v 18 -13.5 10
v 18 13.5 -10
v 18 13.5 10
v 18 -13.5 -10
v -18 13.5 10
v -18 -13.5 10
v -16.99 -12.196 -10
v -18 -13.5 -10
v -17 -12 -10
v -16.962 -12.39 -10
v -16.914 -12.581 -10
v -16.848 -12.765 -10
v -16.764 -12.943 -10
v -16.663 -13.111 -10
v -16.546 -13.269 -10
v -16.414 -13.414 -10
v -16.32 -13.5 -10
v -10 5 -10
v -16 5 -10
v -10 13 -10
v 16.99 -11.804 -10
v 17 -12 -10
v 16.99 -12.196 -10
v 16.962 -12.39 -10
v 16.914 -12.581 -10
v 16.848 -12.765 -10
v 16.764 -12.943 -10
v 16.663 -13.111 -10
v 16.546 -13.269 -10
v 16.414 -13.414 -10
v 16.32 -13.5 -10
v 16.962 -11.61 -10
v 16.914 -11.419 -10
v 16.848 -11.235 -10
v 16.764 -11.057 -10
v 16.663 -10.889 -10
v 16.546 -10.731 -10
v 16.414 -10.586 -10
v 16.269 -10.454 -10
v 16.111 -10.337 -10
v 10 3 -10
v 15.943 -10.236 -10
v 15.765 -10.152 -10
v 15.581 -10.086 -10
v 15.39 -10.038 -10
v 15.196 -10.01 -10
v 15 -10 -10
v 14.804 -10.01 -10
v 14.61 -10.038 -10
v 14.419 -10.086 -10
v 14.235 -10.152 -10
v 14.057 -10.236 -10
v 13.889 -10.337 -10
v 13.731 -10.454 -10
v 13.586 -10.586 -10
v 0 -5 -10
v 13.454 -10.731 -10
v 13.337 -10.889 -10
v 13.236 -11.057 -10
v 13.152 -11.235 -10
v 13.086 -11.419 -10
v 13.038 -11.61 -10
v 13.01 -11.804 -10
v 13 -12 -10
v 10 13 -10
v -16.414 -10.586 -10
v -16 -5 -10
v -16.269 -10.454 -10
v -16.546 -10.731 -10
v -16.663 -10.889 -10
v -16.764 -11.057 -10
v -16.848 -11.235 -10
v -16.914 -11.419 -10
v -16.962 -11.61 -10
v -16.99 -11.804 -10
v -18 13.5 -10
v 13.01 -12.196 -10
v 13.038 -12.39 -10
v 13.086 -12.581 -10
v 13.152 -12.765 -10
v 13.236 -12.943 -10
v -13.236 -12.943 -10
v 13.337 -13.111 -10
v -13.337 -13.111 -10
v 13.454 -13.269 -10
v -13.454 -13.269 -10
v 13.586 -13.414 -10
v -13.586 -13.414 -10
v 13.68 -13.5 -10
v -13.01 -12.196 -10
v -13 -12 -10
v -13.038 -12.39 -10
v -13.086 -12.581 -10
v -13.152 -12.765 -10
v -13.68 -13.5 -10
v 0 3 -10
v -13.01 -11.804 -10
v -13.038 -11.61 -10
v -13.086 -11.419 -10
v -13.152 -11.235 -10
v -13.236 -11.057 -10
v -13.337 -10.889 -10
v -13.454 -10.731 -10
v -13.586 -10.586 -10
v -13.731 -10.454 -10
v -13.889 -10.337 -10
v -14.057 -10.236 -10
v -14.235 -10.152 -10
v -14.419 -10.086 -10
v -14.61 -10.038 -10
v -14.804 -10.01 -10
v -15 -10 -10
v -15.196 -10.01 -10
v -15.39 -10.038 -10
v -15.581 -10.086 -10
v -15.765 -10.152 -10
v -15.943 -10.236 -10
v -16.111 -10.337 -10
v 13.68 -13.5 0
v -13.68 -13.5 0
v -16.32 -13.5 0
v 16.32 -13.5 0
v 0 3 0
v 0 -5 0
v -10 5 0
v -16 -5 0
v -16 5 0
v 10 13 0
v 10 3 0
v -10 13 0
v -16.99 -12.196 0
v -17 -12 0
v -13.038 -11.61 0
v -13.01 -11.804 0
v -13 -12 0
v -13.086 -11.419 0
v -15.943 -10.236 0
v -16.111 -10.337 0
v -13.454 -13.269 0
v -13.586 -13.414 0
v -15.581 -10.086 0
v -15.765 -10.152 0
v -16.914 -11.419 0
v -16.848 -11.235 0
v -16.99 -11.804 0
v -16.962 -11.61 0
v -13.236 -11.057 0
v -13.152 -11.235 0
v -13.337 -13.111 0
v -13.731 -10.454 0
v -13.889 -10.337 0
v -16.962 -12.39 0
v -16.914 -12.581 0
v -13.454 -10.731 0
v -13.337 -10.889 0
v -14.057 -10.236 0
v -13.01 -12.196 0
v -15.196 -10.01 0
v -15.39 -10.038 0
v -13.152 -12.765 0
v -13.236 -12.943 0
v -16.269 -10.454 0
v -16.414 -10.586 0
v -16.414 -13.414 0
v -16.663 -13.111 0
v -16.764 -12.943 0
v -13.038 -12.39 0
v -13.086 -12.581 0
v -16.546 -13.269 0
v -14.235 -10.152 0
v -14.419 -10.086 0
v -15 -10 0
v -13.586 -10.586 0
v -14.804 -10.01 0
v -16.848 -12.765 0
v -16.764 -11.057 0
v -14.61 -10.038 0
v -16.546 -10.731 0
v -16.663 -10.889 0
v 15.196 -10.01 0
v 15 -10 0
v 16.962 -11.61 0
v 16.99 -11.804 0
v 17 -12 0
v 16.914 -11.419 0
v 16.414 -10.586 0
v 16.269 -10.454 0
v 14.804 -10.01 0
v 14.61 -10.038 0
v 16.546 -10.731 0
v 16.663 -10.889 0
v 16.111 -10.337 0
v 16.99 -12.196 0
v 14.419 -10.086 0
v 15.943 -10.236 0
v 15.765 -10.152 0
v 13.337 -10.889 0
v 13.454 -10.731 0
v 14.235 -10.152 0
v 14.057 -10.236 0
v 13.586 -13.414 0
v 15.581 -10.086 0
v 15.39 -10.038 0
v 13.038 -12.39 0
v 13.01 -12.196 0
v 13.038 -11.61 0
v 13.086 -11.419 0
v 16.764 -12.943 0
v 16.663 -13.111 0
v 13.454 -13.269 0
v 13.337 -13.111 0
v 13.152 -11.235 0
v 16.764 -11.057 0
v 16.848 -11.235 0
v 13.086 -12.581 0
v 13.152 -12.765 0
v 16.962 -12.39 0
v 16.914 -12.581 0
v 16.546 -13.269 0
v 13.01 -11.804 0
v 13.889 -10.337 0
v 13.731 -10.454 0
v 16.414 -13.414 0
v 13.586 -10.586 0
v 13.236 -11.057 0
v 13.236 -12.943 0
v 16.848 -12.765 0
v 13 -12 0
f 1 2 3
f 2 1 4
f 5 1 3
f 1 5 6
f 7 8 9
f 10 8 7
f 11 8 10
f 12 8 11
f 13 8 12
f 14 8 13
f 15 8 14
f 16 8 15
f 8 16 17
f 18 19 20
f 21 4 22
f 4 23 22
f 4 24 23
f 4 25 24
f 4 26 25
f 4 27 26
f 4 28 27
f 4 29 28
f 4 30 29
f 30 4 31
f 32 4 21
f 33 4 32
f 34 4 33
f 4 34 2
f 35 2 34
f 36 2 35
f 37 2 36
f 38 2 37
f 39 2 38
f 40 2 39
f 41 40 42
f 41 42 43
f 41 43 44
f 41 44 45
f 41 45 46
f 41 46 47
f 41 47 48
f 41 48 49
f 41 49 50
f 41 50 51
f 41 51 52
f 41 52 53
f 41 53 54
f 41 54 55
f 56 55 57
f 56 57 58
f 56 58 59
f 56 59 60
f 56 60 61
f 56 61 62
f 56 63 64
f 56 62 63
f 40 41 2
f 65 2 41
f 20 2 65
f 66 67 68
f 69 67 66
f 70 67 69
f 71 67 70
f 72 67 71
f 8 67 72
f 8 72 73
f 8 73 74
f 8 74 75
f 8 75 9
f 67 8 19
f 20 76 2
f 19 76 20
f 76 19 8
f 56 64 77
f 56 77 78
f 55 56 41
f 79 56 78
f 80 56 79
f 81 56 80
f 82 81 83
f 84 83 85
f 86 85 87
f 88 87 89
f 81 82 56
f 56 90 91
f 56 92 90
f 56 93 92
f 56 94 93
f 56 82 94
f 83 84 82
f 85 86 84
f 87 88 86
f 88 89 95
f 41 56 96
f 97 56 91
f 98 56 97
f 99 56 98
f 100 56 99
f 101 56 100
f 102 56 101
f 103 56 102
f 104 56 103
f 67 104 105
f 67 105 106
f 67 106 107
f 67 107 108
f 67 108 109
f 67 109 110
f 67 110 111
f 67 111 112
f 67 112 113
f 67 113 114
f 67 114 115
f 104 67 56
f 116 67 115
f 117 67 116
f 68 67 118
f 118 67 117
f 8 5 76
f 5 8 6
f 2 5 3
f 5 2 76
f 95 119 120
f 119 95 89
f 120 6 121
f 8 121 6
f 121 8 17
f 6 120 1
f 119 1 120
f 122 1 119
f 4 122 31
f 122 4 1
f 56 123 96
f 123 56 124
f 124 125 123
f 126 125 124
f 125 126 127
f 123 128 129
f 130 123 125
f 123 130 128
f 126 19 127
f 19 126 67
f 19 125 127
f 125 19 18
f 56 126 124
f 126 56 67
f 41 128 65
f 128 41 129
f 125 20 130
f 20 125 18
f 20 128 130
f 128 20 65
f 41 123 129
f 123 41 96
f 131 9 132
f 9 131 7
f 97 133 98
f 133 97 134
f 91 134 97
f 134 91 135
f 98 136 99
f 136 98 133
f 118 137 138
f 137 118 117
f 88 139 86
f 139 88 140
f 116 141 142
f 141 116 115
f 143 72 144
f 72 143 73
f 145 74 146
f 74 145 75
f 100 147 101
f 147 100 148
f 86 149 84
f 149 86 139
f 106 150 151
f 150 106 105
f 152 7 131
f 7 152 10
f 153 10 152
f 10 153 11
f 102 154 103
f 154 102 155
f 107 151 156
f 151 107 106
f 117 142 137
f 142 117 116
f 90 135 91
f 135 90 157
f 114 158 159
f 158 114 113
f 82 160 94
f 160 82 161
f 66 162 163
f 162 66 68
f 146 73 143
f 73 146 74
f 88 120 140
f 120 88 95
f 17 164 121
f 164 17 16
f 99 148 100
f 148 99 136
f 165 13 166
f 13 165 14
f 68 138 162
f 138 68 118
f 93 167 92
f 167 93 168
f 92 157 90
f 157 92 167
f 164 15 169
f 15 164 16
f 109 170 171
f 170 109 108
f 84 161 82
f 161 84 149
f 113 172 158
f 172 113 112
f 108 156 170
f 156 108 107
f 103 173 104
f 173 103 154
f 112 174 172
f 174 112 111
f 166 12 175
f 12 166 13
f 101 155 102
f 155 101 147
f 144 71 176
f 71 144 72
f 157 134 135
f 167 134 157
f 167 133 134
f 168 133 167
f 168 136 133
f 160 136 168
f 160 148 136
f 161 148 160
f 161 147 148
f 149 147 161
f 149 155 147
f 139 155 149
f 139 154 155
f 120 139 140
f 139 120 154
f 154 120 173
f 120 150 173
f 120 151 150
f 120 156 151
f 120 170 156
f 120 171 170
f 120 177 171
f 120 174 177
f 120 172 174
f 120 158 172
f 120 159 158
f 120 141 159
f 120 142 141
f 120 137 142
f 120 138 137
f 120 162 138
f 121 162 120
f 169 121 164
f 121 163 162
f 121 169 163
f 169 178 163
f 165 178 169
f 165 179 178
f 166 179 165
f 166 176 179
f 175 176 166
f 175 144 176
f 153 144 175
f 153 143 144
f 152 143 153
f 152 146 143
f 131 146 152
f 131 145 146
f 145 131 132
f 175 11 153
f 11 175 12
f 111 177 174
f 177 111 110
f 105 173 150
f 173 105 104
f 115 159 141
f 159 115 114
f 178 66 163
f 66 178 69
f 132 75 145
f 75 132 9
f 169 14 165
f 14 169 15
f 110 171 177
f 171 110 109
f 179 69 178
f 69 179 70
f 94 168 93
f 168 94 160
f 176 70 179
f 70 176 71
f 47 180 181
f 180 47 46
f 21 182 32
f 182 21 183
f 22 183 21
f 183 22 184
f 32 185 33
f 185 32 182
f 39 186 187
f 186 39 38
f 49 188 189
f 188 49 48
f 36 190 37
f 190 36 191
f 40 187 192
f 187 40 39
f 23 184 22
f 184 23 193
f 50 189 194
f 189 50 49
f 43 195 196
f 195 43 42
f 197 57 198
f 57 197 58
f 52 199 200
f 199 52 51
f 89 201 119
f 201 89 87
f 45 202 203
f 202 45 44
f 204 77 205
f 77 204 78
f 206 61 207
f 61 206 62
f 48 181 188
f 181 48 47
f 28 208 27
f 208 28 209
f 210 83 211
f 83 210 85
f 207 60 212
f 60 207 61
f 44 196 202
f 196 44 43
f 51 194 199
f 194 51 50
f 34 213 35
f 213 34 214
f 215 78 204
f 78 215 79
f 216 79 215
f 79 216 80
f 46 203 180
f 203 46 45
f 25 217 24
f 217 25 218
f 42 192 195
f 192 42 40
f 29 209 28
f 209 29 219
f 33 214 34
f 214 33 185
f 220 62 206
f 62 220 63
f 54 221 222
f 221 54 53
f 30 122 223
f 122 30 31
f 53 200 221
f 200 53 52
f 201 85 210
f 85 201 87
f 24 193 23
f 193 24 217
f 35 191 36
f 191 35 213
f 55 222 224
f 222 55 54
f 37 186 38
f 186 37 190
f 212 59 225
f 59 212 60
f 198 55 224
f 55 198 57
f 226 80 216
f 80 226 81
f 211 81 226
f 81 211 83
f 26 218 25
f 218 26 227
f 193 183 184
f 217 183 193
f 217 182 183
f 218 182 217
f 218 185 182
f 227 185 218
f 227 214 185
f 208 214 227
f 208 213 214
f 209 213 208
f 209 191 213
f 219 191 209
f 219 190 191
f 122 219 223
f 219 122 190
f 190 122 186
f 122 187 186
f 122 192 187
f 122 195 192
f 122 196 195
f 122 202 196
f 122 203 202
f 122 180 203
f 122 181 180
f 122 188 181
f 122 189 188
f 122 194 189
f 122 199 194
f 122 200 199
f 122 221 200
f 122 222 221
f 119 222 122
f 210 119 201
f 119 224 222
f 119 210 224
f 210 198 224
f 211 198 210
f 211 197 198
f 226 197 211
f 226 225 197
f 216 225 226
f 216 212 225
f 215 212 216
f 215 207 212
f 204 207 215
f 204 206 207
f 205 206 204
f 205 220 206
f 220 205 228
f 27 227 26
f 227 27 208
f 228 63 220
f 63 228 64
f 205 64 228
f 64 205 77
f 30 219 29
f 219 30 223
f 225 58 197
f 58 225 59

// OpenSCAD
module iec_power_inlet() {
    difference() {
        // Main body
        cube([36, 27, 20], center = true);
        
        // Cutout for fuse holder
        translate([-8, 0, -10])
            cube([16, 10, 20], center = true);
        
        // Cutout for power socket
        translate([0, 8, -10])
            cube([20, 10, 20], center = true);
        
        // Cutout for mounting holes
        translate([-15, -12, -10])
            cylinder(h = 20, r = 2, center = true, $fn = 64);
        translate([15, -12, -10])
            cylinder(h = 20, r = 2, center = true, $fn = 64);
    }
}

iec_power_inlet();
